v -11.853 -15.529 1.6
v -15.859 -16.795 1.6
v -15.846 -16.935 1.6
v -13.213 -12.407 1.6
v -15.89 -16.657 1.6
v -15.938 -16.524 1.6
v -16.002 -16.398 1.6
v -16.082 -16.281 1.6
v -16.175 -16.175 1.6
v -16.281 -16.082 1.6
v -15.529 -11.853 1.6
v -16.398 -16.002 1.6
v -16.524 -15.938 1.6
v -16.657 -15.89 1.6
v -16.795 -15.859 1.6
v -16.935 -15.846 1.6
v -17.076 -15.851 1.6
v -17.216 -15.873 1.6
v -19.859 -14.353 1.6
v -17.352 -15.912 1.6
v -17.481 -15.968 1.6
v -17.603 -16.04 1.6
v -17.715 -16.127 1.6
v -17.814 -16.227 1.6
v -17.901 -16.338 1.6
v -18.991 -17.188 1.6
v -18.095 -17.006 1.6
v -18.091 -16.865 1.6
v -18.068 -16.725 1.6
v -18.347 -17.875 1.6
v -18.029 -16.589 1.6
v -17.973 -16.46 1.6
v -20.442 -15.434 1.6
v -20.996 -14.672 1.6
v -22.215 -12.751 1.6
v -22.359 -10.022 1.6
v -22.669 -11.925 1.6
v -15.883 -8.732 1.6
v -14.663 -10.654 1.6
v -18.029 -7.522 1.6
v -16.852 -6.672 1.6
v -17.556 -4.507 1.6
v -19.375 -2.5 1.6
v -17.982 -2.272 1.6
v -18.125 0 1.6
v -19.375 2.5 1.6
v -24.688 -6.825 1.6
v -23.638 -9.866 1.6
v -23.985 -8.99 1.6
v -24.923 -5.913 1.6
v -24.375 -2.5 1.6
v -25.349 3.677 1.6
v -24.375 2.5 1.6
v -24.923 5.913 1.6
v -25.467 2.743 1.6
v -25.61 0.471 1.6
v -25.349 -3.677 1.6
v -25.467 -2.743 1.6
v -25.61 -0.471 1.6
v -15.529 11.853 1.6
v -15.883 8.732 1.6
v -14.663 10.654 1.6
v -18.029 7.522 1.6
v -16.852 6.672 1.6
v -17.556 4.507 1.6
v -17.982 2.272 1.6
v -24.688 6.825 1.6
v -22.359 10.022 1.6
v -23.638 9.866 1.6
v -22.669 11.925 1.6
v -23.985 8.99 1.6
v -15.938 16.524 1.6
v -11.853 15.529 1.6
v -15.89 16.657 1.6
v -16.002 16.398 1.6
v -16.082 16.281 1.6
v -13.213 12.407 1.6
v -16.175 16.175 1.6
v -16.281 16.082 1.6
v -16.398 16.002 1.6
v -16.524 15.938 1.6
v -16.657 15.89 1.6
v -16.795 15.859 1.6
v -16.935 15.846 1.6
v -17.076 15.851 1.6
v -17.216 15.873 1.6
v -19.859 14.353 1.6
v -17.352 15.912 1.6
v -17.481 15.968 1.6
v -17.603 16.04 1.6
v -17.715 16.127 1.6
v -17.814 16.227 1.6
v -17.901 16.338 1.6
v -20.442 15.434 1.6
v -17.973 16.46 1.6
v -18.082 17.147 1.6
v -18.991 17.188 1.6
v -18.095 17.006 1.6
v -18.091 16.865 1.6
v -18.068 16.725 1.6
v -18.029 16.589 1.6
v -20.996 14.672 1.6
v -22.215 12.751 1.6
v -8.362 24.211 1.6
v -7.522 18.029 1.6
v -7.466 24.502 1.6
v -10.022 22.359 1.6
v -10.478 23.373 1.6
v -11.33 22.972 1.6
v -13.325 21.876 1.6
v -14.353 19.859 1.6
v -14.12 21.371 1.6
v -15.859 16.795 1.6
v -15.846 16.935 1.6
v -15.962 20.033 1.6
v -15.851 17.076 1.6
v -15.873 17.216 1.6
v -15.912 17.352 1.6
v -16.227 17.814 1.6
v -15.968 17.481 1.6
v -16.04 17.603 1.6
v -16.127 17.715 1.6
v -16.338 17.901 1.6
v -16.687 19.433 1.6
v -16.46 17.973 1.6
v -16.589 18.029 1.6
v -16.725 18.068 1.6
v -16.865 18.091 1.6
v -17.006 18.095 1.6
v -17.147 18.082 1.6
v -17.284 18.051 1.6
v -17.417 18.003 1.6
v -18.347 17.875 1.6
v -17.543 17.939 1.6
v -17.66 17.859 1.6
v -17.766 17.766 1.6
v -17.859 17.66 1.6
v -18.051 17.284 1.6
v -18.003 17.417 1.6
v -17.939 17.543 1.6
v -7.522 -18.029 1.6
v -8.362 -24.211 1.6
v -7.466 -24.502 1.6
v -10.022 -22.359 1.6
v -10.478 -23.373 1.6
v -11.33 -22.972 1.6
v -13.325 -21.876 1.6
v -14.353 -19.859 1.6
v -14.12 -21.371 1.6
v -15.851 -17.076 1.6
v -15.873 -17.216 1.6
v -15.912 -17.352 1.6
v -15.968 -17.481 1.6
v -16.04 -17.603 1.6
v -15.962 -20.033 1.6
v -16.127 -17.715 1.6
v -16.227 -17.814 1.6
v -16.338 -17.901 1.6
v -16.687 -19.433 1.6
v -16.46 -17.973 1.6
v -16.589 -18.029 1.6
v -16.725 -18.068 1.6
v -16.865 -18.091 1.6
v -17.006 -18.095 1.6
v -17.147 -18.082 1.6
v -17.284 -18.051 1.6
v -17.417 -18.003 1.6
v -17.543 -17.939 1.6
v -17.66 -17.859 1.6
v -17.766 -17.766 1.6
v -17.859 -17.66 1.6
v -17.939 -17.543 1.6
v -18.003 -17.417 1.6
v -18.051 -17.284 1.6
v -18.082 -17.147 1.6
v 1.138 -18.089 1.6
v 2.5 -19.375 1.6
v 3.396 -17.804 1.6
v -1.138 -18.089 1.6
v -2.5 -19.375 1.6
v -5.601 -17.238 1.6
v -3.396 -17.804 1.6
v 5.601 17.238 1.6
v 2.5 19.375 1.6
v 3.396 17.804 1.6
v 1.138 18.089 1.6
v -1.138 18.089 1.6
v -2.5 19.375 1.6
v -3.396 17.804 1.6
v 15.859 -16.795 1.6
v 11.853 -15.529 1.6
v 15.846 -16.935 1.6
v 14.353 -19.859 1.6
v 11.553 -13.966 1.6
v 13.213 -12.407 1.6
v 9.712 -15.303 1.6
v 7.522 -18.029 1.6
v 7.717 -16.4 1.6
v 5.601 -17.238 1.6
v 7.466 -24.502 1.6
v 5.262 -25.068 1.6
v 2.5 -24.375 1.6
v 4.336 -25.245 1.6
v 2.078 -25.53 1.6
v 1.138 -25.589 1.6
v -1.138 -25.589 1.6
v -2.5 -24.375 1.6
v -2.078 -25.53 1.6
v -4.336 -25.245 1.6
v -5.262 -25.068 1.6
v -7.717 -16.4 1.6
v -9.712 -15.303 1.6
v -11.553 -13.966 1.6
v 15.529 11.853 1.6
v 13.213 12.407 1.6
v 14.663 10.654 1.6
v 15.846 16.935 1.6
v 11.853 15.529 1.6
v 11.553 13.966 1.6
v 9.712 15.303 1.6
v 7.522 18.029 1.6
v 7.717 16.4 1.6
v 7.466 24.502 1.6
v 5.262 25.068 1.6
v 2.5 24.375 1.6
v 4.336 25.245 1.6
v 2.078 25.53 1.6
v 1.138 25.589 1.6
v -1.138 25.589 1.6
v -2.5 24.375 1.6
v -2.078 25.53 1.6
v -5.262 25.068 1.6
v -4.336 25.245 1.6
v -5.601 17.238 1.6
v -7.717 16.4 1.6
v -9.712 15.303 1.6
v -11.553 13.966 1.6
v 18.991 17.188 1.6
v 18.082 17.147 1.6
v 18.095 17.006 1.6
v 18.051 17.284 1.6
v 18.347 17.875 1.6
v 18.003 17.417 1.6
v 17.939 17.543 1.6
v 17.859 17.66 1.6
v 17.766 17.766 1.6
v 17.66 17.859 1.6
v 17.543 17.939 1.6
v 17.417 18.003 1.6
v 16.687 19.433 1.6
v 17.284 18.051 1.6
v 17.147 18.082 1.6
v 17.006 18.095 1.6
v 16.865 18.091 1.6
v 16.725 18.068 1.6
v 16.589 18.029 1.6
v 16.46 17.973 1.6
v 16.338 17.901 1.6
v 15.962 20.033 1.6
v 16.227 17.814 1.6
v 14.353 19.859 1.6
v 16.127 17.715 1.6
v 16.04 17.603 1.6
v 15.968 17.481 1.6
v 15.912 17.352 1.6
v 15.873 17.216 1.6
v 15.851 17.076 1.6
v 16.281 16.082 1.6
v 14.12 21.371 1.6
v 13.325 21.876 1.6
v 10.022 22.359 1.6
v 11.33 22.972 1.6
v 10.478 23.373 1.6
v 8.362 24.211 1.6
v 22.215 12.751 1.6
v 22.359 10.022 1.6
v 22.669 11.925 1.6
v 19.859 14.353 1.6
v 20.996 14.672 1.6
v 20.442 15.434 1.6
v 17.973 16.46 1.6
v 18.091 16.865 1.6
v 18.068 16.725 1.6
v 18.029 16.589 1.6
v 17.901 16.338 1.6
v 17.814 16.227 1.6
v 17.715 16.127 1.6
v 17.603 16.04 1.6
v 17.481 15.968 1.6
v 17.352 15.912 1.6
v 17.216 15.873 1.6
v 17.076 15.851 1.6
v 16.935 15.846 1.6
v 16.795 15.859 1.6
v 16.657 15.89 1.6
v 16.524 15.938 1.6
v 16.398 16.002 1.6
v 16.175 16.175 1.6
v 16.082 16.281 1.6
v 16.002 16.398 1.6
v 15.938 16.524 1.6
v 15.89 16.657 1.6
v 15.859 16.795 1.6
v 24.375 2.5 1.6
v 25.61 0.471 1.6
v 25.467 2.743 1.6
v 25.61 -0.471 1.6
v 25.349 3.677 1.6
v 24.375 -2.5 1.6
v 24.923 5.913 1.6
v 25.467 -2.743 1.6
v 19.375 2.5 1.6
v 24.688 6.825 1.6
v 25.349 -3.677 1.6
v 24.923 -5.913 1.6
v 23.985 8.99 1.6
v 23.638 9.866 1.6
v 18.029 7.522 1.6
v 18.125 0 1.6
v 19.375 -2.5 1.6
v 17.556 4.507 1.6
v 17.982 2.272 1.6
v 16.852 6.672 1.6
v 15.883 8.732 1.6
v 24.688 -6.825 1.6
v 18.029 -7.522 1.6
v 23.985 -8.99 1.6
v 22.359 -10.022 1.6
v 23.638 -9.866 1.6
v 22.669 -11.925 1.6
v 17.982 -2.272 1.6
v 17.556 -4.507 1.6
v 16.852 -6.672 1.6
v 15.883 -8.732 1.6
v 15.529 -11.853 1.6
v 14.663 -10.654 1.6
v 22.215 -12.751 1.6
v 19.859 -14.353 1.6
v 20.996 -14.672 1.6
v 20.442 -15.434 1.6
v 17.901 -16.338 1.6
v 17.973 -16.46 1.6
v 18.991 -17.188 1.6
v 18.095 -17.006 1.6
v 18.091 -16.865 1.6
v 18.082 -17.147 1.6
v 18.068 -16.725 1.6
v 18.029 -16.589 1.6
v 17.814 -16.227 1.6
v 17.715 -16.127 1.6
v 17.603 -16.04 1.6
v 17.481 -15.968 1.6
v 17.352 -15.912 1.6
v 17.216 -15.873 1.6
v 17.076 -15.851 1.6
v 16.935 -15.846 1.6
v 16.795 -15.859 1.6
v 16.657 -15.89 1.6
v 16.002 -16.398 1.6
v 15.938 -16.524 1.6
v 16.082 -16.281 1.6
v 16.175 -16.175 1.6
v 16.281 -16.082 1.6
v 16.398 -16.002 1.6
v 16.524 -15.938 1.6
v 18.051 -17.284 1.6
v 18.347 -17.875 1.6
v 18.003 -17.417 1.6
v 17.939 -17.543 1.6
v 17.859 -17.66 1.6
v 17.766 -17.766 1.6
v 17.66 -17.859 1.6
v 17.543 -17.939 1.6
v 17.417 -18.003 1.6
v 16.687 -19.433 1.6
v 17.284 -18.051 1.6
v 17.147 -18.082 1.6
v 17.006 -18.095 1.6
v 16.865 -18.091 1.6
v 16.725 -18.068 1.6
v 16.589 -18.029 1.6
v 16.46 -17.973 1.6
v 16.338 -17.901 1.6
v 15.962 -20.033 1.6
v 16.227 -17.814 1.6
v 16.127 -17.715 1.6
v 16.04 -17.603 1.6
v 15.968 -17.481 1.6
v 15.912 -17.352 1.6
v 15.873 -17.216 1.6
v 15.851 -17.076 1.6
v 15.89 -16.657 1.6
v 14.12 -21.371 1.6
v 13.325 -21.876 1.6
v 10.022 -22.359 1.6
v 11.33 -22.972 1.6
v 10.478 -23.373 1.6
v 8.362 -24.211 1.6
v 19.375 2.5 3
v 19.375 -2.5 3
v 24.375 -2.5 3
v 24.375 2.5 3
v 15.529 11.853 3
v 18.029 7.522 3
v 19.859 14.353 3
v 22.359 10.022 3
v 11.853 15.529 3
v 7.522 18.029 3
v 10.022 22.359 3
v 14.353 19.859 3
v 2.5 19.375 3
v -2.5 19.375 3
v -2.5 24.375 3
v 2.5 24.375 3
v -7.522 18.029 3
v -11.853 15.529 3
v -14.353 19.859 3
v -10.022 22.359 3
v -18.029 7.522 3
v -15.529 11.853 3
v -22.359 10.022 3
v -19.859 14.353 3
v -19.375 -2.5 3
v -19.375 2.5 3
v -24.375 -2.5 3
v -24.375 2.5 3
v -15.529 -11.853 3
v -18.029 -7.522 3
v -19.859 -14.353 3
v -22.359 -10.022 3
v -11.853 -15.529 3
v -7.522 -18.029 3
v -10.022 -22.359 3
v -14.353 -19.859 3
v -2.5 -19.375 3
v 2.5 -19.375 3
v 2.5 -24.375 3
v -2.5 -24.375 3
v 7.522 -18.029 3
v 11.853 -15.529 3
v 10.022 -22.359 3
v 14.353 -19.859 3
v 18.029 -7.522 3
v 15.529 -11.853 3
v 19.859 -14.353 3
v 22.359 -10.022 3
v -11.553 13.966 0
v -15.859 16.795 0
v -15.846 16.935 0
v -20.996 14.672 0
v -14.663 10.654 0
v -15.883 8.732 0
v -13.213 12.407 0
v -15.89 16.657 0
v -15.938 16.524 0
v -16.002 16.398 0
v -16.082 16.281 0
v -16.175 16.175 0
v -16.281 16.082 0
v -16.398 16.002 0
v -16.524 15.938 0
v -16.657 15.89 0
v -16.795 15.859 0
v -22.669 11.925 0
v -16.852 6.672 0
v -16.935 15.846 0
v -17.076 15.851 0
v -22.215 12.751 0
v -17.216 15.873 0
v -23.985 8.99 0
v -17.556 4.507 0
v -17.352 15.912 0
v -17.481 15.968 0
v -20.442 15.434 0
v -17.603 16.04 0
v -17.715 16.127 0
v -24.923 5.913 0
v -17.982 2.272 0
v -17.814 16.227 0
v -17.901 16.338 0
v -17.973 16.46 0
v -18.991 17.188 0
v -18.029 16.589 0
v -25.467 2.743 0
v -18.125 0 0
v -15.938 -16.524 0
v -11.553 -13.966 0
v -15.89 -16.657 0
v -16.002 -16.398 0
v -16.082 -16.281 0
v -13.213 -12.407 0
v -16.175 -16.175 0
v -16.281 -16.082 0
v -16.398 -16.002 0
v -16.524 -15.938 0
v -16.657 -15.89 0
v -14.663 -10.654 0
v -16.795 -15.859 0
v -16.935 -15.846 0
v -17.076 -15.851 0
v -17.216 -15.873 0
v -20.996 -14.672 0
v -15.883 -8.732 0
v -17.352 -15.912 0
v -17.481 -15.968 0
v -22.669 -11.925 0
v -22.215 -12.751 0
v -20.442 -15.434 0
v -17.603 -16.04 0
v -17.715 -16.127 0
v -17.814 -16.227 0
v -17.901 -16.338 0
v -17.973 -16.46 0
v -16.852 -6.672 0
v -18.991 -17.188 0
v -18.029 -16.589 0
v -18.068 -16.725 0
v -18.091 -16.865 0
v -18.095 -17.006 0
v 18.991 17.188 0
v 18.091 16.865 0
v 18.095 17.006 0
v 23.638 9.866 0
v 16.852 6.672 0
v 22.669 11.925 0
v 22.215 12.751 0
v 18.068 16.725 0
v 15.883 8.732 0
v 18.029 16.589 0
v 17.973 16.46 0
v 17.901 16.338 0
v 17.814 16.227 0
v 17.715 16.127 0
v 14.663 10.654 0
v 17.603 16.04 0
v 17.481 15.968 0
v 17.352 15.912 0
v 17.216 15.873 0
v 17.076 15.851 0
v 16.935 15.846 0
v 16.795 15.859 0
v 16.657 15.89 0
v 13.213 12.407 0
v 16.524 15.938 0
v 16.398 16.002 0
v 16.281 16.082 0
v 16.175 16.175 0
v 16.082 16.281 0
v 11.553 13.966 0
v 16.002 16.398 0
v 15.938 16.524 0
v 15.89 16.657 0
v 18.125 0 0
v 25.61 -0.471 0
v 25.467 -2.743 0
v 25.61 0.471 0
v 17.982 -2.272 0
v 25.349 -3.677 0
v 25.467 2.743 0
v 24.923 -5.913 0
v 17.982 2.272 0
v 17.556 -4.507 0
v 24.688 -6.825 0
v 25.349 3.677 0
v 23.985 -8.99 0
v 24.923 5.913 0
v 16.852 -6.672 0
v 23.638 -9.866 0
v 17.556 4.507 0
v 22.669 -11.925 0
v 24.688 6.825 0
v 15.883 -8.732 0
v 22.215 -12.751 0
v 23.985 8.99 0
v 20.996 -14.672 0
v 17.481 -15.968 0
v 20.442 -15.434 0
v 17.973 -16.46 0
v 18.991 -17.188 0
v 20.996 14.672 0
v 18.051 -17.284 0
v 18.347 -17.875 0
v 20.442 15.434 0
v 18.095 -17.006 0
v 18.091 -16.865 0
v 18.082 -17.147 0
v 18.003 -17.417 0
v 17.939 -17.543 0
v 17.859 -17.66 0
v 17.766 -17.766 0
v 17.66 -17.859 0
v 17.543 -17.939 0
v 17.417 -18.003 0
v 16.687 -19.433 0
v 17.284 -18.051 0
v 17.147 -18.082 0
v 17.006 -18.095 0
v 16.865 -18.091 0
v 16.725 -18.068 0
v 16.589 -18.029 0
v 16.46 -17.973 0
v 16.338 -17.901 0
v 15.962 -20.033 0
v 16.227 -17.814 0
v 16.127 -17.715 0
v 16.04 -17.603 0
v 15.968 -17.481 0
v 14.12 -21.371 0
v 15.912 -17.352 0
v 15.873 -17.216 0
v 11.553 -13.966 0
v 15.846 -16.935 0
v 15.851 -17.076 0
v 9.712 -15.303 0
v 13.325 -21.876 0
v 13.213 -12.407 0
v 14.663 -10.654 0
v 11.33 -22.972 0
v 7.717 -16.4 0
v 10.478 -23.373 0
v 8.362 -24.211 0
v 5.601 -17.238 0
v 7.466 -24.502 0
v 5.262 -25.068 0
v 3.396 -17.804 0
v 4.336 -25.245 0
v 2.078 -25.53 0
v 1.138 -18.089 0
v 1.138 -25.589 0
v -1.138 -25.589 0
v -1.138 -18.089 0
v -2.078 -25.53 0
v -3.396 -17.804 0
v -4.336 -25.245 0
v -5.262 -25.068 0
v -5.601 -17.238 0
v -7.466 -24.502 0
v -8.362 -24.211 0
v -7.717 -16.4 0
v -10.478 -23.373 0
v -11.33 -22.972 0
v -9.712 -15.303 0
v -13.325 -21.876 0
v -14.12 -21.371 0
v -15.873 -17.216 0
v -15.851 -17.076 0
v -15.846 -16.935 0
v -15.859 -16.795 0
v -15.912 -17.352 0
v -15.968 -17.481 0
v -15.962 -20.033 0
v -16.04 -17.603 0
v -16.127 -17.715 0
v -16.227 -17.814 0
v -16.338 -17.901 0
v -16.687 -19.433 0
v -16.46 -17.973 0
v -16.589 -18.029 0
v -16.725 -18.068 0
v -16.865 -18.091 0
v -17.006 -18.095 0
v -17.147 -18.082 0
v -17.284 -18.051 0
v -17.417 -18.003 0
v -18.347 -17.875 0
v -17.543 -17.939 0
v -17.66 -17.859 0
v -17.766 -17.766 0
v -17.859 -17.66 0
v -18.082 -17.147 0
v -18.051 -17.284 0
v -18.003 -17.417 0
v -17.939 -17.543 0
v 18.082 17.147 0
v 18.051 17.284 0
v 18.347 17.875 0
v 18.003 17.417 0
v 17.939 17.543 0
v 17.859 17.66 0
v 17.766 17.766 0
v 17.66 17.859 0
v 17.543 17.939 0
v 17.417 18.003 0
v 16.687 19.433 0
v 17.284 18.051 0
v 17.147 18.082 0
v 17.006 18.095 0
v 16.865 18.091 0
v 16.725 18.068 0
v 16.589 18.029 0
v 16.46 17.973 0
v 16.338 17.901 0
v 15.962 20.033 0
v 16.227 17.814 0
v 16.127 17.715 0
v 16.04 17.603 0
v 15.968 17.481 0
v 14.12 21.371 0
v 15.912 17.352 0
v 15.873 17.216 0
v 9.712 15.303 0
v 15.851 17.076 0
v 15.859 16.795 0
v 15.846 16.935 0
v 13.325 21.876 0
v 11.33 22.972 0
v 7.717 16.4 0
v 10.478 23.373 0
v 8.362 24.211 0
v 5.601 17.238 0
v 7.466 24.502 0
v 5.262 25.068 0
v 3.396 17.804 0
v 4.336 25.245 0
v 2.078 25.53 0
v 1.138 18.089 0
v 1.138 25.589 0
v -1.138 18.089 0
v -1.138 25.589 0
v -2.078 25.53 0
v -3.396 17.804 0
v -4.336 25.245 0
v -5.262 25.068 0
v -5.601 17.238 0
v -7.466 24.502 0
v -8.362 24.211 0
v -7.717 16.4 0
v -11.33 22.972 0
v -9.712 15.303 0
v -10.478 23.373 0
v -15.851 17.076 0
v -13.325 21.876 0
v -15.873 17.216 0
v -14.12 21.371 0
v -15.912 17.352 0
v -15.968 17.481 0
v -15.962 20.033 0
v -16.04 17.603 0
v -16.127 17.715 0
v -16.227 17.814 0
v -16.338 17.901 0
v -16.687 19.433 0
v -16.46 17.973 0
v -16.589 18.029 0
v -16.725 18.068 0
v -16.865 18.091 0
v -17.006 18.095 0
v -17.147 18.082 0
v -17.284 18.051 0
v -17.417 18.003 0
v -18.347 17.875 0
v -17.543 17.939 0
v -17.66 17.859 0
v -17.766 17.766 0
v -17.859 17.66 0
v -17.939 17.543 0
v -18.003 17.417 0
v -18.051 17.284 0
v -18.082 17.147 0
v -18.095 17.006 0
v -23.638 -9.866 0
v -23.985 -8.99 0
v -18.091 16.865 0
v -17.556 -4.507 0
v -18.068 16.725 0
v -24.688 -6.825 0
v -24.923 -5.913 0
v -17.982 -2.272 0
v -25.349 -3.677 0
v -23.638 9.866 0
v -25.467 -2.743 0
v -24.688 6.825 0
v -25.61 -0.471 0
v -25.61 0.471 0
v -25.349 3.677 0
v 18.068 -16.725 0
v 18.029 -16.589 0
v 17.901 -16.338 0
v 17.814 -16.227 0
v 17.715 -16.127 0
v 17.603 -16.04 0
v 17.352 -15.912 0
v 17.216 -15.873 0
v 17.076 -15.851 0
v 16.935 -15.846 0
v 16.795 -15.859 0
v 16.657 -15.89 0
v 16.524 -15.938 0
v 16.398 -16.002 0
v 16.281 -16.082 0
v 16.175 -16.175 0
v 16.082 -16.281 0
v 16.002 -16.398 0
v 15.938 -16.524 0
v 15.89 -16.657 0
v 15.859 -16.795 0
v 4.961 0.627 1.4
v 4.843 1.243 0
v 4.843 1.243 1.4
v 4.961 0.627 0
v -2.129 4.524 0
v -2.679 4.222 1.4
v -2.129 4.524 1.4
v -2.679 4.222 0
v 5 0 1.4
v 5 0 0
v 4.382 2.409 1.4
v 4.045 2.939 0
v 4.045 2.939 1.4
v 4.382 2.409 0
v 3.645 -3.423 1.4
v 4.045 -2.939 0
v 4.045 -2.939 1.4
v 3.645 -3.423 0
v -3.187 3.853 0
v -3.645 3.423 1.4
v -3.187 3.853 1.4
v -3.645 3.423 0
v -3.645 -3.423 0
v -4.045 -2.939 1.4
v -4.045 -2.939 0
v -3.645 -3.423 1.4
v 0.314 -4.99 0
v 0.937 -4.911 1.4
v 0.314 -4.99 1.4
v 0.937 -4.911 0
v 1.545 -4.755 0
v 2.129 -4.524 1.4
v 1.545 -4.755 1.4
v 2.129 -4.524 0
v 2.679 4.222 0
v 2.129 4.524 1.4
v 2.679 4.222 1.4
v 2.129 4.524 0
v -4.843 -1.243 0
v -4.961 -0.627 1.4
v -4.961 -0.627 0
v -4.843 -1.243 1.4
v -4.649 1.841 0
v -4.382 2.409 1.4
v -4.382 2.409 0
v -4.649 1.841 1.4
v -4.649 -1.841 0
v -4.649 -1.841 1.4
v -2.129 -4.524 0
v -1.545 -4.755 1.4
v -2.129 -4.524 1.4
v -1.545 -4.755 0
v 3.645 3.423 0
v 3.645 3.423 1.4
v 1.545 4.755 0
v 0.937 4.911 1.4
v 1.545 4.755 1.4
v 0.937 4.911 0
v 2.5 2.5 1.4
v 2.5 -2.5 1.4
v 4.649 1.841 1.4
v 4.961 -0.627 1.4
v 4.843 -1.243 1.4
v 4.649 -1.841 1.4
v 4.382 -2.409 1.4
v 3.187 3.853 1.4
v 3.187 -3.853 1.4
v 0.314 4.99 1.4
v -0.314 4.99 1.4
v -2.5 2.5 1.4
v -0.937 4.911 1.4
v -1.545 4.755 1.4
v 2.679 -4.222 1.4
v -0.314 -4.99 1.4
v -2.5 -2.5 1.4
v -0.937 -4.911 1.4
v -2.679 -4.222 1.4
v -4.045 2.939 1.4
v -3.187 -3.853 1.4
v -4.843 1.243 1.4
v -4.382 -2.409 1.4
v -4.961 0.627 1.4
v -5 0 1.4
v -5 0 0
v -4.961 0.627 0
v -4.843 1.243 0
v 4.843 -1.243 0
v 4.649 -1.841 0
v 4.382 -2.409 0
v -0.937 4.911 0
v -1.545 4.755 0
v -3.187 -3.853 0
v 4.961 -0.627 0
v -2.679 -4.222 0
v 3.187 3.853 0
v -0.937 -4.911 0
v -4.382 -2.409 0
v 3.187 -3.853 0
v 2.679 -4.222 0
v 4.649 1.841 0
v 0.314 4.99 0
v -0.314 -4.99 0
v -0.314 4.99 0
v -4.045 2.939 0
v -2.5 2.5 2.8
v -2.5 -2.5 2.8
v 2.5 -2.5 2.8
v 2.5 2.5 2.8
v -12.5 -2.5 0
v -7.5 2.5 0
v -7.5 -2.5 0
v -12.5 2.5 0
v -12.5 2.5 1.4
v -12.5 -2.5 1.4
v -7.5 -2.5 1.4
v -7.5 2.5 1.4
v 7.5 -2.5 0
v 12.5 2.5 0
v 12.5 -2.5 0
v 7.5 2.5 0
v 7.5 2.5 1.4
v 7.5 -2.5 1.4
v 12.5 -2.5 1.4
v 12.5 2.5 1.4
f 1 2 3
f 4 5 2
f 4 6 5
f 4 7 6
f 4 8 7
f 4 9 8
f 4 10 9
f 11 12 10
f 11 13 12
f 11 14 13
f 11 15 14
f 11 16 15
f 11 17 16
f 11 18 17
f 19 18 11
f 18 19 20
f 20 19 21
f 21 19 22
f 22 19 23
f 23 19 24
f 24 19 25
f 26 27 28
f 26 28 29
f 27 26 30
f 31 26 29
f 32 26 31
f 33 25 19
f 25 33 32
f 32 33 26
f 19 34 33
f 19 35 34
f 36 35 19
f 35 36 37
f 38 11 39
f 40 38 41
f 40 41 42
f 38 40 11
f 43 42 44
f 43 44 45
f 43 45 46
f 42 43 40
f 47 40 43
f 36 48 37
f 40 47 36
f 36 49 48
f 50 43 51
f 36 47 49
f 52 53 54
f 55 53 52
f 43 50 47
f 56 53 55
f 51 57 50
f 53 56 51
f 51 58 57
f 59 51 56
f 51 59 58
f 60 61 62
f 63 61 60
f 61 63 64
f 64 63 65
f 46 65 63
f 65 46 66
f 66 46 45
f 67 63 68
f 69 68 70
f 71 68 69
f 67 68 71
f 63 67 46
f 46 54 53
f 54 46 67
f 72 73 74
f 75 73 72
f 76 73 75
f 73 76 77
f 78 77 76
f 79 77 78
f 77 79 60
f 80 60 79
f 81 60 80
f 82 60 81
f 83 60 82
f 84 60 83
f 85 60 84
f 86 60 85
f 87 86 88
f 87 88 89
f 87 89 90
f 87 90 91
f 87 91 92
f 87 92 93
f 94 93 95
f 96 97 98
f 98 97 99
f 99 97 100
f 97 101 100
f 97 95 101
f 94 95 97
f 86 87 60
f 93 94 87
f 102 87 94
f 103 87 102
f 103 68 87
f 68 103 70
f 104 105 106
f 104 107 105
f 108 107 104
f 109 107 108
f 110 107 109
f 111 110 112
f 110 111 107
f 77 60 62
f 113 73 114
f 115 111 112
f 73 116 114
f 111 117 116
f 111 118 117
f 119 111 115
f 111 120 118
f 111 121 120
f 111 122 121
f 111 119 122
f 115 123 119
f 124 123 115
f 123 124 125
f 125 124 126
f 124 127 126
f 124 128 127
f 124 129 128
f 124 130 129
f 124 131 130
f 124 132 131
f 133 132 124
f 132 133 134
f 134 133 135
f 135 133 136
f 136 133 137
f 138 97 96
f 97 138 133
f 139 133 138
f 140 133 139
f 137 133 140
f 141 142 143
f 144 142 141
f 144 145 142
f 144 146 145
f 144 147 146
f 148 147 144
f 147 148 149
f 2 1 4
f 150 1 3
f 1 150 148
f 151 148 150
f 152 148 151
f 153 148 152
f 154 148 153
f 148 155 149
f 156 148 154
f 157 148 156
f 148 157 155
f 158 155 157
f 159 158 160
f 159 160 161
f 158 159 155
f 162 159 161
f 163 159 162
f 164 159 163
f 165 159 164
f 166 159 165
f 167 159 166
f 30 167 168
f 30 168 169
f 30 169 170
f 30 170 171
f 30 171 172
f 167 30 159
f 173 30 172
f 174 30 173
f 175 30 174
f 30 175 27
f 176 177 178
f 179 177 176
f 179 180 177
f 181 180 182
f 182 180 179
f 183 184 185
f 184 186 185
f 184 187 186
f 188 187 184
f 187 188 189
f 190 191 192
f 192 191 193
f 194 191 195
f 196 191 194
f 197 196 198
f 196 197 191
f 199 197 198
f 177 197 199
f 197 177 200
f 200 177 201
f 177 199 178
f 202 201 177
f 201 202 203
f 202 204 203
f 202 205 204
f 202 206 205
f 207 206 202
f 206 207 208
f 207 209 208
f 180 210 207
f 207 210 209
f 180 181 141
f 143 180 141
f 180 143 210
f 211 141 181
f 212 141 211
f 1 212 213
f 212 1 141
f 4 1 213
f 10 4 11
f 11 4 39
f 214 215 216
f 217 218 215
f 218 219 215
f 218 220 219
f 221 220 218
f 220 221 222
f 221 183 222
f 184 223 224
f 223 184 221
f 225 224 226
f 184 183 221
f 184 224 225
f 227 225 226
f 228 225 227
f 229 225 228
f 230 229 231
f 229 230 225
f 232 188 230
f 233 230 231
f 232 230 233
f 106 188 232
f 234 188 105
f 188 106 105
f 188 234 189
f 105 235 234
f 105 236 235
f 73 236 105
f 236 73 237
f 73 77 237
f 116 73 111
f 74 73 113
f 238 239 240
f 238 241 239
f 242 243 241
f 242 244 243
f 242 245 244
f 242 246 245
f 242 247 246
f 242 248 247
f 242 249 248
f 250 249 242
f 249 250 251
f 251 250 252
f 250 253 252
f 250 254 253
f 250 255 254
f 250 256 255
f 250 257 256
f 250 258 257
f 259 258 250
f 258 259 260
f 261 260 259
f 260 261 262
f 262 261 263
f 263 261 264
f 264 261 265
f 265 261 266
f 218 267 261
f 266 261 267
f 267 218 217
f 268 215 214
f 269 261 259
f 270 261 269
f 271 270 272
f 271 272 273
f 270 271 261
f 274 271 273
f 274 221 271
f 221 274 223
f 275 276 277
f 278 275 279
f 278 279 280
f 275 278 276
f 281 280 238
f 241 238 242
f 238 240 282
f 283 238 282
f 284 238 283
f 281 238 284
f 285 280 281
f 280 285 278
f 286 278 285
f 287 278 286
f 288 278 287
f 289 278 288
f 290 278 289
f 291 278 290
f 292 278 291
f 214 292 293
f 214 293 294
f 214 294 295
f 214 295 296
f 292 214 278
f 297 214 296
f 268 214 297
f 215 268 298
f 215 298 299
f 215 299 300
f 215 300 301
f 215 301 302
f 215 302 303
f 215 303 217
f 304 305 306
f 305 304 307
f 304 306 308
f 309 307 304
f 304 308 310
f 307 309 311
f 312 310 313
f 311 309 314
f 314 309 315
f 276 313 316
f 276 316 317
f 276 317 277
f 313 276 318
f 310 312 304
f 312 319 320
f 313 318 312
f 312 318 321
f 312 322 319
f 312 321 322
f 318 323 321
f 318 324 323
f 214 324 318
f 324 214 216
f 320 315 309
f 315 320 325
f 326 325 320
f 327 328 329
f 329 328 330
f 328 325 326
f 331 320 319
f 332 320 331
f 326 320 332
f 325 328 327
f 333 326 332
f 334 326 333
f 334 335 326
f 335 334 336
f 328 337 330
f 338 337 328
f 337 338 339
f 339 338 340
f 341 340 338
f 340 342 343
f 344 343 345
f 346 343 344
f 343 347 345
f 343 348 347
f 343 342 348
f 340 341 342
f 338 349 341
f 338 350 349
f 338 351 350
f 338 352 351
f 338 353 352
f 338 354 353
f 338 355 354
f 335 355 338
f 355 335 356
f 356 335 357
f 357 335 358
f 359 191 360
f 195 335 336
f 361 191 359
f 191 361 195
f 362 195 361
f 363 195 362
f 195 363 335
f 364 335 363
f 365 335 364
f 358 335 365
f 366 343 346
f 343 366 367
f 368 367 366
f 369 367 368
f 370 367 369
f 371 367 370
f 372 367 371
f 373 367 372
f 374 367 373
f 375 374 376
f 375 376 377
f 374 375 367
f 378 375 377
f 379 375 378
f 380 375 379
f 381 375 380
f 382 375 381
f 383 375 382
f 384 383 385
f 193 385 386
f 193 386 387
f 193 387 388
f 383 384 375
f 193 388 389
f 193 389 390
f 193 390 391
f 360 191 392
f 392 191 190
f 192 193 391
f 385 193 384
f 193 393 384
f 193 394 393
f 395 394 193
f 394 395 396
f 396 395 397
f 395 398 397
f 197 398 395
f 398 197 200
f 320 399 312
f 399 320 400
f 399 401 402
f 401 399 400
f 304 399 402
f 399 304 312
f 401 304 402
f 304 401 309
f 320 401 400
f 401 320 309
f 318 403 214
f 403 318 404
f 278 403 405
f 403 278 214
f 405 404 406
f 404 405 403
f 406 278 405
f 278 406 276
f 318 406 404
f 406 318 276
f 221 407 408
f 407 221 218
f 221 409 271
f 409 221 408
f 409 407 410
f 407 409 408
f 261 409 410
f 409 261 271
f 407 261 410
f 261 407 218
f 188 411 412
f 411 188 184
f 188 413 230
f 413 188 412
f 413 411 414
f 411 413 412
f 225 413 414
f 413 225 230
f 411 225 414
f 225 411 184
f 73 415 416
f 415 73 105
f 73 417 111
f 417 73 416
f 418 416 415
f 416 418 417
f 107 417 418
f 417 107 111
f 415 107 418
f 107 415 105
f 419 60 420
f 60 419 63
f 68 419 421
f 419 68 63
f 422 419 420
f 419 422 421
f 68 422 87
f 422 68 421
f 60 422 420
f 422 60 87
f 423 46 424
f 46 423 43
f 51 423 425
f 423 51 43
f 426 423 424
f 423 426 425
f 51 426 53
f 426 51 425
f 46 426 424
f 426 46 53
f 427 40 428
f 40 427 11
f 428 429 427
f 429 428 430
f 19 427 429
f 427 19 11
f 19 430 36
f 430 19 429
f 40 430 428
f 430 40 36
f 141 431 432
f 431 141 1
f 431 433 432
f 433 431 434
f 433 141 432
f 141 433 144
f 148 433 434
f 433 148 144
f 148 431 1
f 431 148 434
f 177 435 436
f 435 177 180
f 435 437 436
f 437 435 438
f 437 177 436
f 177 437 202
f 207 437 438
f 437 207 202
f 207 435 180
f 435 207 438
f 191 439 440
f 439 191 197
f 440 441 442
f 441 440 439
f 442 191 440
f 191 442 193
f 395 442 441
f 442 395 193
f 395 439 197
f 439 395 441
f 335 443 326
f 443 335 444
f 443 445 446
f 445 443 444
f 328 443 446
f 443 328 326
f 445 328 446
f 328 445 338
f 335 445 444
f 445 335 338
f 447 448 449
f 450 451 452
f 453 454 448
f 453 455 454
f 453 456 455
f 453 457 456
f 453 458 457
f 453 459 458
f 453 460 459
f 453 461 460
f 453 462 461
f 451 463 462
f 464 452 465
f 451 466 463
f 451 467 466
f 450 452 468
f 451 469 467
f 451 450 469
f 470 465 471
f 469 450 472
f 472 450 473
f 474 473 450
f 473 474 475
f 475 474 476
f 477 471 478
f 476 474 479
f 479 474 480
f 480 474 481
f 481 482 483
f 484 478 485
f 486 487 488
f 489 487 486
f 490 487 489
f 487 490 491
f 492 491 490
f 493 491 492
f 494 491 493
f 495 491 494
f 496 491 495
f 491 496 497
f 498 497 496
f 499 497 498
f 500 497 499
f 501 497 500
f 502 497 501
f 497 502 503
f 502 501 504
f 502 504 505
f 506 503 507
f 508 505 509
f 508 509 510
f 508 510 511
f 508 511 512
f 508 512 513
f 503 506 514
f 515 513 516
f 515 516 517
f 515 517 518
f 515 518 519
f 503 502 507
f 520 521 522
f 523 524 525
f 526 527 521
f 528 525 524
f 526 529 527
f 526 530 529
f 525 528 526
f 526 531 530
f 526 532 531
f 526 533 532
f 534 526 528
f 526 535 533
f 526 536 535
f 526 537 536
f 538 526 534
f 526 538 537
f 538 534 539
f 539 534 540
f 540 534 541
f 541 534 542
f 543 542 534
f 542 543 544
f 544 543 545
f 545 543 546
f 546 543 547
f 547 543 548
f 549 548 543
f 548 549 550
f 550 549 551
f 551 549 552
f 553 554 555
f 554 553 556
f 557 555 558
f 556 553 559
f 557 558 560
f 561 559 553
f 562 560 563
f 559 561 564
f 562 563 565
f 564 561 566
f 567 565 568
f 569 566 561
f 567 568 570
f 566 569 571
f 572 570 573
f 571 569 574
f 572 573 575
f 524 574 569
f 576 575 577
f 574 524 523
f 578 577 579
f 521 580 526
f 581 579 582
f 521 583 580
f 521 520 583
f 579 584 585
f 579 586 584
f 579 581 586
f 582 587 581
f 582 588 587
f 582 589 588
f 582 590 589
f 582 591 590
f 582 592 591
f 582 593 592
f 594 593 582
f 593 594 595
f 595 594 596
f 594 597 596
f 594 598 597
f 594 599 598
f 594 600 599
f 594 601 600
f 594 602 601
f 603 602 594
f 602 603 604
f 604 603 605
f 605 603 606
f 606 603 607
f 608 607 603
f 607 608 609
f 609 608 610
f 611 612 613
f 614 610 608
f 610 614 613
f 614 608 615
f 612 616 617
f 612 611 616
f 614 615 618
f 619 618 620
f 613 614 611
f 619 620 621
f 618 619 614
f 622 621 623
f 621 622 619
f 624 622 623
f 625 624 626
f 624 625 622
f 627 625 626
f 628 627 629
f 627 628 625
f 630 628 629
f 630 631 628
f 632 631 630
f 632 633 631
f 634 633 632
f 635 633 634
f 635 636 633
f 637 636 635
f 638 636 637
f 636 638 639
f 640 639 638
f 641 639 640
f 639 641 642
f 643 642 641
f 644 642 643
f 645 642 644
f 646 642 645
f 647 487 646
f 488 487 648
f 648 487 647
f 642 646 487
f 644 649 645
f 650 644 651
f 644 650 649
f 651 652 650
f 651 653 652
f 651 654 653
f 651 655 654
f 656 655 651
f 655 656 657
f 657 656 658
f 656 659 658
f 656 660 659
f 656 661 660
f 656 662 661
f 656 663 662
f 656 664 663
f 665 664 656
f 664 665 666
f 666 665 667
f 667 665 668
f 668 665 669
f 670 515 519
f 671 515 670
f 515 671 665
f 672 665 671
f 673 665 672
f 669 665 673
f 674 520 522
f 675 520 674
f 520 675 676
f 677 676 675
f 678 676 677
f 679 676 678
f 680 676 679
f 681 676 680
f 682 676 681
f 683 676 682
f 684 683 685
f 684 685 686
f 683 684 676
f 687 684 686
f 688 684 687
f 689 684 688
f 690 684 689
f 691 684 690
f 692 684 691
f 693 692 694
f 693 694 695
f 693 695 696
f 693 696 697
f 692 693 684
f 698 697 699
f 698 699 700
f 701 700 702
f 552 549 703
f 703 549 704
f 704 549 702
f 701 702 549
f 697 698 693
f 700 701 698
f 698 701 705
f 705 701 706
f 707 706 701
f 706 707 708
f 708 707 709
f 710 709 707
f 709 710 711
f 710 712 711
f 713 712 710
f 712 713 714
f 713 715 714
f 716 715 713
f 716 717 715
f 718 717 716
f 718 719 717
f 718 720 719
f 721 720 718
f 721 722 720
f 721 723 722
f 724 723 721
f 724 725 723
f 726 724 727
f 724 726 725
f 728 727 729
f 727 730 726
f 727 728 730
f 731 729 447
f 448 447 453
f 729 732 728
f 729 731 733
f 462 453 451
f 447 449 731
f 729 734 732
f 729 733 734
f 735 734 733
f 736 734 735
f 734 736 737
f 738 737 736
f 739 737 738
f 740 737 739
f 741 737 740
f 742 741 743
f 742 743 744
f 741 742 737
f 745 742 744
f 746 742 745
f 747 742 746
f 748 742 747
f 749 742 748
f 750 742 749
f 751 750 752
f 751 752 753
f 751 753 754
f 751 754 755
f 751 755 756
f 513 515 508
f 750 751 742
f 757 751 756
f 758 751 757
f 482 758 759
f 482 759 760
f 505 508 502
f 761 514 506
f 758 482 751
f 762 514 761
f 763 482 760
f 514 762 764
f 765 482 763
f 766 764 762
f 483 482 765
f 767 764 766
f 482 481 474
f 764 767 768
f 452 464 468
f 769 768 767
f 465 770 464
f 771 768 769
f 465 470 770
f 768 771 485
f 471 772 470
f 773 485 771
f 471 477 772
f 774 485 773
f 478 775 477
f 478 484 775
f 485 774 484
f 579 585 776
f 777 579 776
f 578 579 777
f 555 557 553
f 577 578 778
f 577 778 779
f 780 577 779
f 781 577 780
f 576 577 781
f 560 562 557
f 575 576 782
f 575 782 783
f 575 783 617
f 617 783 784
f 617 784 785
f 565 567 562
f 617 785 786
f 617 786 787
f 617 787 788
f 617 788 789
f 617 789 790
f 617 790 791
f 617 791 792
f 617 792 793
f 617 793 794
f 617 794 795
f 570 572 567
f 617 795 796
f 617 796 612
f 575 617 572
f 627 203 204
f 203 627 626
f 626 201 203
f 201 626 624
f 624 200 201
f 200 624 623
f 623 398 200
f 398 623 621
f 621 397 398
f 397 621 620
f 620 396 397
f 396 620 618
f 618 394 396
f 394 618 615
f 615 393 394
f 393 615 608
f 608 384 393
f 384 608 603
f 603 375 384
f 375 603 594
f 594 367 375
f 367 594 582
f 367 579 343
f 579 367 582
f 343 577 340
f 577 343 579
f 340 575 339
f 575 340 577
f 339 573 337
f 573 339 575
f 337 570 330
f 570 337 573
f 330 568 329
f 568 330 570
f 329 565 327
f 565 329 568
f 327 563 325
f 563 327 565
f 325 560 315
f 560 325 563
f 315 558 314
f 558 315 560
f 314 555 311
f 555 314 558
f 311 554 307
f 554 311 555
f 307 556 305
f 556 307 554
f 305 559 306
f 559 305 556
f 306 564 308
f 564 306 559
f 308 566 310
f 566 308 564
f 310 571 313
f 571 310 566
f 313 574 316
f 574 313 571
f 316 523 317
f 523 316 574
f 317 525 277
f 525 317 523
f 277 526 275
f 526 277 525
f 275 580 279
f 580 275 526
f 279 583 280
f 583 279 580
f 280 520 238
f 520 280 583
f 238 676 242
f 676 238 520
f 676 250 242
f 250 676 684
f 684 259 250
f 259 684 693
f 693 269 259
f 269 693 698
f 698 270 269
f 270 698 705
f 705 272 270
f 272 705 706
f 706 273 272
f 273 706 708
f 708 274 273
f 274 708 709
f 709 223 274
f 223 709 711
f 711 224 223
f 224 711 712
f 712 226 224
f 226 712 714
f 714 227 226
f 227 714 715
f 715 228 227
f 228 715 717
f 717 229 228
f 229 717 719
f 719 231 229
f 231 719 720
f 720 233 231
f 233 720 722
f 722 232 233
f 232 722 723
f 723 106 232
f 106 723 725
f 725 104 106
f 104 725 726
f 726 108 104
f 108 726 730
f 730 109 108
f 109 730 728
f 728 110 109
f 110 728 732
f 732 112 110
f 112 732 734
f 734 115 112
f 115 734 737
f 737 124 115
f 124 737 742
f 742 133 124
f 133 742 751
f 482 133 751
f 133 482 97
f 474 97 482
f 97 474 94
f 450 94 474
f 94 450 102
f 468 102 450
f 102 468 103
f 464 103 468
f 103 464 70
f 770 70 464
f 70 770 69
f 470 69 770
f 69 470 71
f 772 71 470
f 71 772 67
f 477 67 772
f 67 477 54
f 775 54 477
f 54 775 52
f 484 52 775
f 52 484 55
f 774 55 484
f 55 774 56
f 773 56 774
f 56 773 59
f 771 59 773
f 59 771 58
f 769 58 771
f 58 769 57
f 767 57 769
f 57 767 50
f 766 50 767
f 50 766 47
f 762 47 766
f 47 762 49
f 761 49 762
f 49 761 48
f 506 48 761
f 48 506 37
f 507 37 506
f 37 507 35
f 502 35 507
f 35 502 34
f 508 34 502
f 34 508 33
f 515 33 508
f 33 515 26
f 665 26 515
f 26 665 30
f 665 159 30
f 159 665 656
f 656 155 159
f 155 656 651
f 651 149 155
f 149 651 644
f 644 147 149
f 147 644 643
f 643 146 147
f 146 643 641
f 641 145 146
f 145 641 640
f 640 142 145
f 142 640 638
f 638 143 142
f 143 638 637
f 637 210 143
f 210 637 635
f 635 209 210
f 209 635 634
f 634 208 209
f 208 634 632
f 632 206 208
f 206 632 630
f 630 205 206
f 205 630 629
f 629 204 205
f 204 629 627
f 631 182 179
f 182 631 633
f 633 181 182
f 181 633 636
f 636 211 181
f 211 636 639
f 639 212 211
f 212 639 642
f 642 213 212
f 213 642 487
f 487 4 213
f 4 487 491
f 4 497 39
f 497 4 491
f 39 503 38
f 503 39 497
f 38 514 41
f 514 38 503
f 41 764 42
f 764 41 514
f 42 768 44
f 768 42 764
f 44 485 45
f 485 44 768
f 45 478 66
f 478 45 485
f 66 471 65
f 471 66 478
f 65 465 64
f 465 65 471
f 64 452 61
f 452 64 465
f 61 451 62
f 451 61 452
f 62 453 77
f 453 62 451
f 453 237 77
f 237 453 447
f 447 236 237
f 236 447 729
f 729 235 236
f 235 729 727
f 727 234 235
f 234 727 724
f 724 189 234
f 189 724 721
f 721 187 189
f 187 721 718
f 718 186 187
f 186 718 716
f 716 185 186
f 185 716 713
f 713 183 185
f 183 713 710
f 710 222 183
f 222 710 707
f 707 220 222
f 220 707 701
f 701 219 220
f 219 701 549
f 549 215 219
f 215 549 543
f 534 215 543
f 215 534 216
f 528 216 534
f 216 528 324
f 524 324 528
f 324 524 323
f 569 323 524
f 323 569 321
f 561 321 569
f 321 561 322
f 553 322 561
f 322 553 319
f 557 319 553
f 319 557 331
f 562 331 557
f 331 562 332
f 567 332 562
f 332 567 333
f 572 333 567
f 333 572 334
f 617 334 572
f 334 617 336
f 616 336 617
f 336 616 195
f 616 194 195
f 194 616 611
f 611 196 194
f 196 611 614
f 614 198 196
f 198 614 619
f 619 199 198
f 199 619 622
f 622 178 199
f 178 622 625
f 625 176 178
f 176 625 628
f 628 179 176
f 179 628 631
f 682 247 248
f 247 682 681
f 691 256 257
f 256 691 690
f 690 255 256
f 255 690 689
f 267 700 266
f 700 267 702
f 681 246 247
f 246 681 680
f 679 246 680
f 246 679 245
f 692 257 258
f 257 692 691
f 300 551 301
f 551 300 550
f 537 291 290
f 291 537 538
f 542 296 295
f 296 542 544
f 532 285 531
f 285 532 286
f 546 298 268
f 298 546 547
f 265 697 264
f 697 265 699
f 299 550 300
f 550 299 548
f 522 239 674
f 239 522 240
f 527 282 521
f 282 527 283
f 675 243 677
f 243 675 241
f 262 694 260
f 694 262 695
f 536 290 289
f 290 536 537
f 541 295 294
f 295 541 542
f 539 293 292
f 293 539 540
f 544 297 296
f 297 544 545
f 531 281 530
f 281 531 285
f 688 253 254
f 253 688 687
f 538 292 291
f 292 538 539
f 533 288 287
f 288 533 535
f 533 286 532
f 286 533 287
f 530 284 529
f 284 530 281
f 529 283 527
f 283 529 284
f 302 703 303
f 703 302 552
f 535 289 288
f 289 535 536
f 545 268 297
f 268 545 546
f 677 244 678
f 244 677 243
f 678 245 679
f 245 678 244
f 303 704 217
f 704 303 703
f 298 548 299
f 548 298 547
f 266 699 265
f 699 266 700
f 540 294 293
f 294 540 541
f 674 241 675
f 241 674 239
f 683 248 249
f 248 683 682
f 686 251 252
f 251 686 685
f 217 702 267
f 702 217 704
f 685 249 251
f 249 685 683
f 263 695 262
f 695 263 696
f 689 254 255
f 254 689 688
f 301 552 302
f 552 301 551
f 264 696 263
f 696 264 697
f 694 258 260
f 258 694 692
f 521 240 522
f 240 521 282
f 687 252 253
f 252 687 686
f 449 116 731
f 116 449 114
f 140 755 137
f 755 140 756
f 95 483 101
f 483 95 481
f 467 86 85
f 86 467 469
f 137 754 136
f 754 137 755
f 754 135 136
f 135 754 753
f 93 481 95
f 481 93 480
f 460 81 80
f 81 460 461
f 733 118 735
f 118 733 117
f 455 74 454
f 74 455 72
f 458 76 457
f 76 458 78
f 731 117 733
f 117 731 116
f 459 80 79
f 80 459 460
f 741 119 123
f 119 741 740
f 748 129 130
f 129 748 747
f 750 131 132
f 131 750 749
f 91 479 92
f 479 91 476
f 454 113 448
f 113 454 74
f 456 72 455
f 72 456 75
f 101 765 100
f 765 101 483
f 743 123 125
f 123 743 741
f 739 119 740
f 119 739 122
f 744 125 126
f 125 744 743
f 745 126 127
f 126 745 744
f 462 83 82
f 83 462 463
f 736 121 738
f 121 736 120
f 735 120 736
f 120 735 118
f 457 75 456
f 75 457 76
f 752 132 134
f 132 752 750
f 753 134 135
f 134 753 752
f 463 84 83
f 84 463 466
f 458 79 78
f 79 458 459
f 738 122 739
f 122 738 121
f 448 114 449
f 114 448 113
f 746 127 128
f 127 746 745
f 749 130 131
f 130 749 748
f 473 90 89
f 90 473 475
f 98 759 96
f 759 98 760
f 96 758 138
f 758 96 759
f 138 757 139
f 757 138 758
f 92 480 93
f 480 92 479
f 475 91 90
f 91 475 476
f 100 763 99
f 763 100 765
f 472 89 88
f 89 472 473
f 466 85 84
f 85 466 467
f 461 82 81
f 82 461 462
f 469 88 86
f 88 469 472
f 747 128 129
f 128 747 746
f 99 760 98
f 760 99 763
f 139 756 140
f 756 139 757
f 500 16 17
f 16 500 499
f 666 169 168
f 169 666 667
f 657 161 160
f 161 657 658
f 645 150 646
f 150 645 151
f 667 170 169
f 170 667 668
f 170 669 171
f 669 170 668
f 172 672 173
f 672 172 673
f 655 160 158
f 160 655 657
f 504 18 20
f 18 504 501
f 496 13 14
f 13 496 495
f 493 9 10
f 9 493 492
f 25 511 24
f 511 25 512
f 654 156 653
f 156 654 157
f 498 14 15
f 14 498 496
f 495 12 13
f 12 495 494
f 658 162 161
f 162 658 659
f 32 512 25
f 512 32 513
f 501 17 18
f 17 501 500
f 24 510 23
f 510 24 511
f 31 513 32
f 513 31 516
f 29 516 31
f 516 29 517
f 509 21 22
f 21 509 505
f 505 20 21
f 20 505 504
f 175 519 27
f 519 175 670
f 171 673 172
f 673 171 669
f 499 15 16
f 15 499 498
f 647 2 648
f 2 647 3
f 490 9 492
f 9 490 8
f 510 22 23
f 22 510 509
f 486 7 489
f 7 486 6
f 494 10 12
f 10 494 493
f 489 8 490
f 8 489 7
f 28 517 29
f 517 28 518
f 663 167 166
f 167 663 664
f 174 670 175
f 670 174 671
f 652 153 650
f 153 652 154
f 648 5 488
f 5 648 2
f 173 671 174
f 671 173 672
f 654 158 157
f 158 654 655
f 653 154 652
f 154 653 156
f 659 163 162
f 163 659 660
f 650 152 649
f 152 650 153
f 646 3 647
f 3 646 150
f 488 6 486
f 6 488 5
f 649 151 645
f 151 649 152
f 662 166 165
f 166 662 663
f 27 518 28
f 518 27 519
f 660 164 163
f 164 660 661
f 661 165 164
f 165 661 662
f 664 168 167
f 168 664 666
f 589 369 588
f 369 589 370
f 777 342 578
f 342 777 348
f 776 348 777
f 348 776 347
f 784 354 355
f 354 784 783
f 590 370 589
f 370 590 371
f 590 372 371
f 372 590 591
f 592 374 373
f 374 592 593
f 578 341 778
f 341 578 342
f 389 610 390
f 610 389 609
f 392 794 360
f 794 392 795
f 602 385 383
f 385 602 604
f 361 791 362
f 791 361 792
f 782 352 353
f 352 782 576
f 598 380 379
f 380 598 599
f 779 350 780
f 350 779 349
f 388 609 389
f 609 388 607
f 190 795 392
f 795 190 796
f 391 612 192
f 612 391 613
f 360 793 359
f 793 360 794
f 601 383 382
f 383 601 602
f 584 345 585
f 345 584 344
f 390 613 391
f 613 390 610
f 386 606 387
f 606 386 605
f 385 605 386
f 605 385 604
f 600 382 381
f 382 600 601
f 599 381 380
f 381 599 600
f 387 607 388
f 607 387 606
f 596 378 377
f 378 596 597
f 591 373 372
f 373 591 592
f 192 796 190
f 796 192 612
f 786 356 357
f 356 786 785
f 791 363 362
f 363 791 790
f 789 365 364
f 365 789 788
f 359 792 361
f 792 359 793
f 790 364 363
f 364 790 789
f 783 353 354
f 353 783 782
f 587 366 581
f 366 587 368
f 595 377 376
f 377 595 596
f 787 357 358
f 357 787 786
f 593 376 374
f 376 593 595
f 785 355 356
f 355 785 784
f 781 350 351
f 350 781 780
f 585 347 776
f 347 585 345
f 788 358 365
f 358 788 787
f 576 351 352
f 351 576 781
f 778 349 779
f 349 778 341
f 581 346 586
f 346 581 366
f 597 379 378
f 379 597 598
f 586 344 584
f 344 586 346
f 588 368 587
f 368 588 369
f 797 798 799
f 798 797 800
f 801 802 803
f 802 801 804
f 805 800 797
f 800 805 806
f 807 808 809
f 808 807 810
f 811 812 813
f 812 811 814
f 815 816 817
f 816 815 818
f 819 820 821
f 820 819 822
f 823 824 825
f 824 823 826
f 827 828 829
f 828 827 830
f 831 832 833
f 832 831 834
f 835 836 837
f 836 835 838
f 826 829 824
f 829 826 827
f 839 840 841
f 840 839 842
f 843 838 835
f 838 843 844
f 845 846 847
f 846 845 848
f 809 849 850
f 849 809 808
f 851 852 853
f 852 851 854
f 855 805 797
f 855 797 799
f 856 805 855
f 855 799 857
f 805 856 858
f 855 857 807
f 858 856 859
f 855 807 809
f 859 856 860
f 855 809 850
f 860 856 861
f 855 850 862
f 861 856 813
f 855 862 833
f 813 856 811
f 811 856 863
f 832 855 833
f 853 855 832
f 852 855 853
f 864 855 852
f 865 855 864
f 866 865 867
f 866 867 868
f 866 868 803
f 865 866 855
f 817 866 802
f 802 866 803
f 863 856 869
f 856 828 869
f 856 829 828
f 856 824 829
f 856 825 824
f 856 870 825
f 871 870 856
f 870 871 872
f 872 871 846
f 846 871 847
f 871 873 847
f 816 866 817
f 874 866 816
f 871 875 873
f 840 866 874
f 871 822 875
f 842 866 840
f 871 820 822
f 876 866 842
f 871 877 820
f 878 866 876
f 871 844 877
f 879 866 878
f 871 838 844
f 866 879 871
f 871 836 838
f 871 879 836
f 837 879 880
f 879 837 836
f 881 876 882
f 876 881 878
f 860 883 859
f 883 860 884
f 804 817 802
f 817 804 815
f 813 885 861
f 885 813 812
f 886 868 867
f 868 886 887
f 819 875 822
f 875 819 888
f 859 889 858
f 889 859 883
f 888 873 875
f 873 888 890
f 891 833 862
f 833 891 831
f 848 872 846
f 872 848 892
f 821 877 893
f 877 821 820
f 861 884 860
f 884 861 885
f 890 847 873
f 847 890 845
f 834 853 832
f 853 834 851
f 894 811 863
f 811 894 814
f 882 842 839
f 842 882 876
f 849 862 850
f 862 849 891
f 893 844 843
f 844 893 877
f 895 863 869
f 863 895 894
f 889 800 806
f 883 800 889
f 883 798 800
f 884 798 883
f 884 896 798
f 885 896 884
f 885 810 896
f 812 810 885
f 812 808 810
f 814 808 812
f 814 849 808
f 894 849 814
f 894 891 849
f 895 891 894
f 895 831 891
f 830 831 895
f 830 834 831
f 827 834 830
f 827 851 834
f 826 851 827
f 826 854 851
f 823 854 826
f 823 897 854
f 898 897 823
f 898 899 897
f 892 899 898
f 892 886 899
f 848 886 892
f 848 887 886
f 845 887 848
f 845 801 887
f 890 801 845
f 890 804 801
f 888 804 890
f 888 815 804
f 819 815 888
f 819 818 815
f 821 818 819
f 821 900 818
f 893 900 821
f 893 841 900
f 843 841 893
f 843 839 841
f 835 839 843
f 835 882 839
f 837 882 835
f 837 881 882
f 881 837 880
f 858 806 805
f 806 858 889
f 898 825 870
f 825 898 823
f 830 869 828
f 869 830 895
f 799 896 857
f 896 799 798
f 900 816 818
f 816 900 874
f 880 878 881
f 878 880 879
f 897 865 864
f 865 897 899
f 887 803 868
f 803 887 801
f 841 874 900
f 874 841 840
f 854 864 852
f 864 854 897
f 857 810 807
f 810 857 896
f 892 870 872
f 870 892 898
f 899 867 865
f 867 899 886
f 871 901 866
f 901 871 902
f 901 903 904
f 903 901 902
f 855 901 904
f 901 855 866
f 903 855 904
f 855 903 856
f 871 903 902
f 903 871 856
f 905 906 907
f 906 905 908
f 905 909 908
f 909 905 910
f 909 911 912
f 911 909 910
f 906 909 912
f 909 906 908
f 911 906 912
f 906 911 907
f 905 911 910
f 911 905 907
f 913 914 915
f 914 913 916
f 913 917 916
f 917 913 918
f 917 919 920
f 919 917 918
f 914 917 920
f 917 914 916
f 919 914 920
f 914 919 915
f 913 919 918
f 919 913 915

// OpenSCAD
/*
 * Neopixel LED Library
 *
 * Includes modules for
 *  - a single square LED
 *  - square LED on a PCB breakout
 *  - a 12 pixel ring
 *  - a helper function to make new neopixel rings
 */

// Small positive value constant
eps=0.1;

$fn=50;

module neopixel_led(center=false, color="silver") {
    // The square neopixel - https://cdn-shop.adafruit.com/datasheets/WS2812B.pdf
    // Values in mm
    square_width = 5.0;
    square_height = 5.0;

    full_height = 2.8;
    pcb_height = 1.4;
    led_height = full_height-pcb_height;

    translate(center ? [-square_width/2, -square_height/2, 0] : [0, 0, 0])
    union() {
        color("white")
            linear_extrude(led_height)
            square([square_width, square_height]);

        %color(color)
            translate([square_width/2, square_height/2, led_height-0.1])
            linear_extrude(0.1 + eps)
            circle(d=0.9*square_width);
    }
}

module neopixel_led_breakoff(color="silver") {
    // https://www.amazon.com/gp/product/B01DC0J0WS
    // Values in mm
    pcb_diameter = 10;
    pcb_height = 1.4;
    union() {
        color("lavender")
            linear_extrude(pcb_height)
            circle(d=pcb_diameter);

        translate([0, 0, pcb_height])
            neopixel_led(center=true, color=color);
    }
}

module annulus(inner_diameter, annulus_width) {
    difference() {
        offset(annulus_width)
        circle(d=inner_diameter);
        circle(d=inner_diameter);
    }
}

module neopixel_led_general_ring(inner_diameter, annulus_width, pcb_height, num_leds, colors, pixel_buffer) {
    // Generic neopixel ring
    // Construct annulus pcb
    linear_extrude(pcb_height, convexity=2)
    annulus(inner_diameter, annulus_width);
    // Add the neopixels
    for (i = [0:num_leds-1]) {
        rotate(i * 360/num_leds, [0, 0, 1])
        translate([inner_diameter/2 + annulus_width/2, 0, pcb_height])
        minkowski() {
            neopixel_led(center=true, color=i < len(colors) ? colors[i] : "silver");
            sphere(r=pixel_buffer);
        }
    }
}

module neopixel_led_12px_ring(colors, pixel_buffer=0) {
    // Our 12 led ring
    // Values in mm
    inner_diameter = 36.25;
    annulus_width = 7.5;
    pcb_height = 1.6;
    num_leds = 12;
    module screw_holes() {
        screw_hole_diameter = 2.25;
        screw_radial_offset = 0.5;
        screw_hole_centers = inner_diameter/2 + annulus_width - screw_radial_offset - screw_hole_diameter/2;
        union() {
            for (i = [0:3]) {
                rotate(45 + i * 90, [0, 0, 1])
                translate([screw_hole_centers, 0, -eps])
                linear_extrude(pcb_height + 2*eps)
                circle(d=screw_hole_diameter);
            }
        }
    }

    difference() {
        neopixel_led_general_ring(inner_diameter, annulus_width, pcb_height, num_leds, colors, pixel_buffer);
        screw_holes();
    }
}

neopixel_led_12px_ring(["royalblue", "yellow",
"royalblue", "yellow",
"royalblue", "yellow",
"royalblue", "yellow",
"royalblue", "yellow",
"royalblue", "yellow"]);

translate([-10,0,0])
    neopixel_led(center=true, color="red");

translate([10,0,0])
    neopixel_led(center=true, color="green");

neopixel_led_breakoff(color="royalblue");
